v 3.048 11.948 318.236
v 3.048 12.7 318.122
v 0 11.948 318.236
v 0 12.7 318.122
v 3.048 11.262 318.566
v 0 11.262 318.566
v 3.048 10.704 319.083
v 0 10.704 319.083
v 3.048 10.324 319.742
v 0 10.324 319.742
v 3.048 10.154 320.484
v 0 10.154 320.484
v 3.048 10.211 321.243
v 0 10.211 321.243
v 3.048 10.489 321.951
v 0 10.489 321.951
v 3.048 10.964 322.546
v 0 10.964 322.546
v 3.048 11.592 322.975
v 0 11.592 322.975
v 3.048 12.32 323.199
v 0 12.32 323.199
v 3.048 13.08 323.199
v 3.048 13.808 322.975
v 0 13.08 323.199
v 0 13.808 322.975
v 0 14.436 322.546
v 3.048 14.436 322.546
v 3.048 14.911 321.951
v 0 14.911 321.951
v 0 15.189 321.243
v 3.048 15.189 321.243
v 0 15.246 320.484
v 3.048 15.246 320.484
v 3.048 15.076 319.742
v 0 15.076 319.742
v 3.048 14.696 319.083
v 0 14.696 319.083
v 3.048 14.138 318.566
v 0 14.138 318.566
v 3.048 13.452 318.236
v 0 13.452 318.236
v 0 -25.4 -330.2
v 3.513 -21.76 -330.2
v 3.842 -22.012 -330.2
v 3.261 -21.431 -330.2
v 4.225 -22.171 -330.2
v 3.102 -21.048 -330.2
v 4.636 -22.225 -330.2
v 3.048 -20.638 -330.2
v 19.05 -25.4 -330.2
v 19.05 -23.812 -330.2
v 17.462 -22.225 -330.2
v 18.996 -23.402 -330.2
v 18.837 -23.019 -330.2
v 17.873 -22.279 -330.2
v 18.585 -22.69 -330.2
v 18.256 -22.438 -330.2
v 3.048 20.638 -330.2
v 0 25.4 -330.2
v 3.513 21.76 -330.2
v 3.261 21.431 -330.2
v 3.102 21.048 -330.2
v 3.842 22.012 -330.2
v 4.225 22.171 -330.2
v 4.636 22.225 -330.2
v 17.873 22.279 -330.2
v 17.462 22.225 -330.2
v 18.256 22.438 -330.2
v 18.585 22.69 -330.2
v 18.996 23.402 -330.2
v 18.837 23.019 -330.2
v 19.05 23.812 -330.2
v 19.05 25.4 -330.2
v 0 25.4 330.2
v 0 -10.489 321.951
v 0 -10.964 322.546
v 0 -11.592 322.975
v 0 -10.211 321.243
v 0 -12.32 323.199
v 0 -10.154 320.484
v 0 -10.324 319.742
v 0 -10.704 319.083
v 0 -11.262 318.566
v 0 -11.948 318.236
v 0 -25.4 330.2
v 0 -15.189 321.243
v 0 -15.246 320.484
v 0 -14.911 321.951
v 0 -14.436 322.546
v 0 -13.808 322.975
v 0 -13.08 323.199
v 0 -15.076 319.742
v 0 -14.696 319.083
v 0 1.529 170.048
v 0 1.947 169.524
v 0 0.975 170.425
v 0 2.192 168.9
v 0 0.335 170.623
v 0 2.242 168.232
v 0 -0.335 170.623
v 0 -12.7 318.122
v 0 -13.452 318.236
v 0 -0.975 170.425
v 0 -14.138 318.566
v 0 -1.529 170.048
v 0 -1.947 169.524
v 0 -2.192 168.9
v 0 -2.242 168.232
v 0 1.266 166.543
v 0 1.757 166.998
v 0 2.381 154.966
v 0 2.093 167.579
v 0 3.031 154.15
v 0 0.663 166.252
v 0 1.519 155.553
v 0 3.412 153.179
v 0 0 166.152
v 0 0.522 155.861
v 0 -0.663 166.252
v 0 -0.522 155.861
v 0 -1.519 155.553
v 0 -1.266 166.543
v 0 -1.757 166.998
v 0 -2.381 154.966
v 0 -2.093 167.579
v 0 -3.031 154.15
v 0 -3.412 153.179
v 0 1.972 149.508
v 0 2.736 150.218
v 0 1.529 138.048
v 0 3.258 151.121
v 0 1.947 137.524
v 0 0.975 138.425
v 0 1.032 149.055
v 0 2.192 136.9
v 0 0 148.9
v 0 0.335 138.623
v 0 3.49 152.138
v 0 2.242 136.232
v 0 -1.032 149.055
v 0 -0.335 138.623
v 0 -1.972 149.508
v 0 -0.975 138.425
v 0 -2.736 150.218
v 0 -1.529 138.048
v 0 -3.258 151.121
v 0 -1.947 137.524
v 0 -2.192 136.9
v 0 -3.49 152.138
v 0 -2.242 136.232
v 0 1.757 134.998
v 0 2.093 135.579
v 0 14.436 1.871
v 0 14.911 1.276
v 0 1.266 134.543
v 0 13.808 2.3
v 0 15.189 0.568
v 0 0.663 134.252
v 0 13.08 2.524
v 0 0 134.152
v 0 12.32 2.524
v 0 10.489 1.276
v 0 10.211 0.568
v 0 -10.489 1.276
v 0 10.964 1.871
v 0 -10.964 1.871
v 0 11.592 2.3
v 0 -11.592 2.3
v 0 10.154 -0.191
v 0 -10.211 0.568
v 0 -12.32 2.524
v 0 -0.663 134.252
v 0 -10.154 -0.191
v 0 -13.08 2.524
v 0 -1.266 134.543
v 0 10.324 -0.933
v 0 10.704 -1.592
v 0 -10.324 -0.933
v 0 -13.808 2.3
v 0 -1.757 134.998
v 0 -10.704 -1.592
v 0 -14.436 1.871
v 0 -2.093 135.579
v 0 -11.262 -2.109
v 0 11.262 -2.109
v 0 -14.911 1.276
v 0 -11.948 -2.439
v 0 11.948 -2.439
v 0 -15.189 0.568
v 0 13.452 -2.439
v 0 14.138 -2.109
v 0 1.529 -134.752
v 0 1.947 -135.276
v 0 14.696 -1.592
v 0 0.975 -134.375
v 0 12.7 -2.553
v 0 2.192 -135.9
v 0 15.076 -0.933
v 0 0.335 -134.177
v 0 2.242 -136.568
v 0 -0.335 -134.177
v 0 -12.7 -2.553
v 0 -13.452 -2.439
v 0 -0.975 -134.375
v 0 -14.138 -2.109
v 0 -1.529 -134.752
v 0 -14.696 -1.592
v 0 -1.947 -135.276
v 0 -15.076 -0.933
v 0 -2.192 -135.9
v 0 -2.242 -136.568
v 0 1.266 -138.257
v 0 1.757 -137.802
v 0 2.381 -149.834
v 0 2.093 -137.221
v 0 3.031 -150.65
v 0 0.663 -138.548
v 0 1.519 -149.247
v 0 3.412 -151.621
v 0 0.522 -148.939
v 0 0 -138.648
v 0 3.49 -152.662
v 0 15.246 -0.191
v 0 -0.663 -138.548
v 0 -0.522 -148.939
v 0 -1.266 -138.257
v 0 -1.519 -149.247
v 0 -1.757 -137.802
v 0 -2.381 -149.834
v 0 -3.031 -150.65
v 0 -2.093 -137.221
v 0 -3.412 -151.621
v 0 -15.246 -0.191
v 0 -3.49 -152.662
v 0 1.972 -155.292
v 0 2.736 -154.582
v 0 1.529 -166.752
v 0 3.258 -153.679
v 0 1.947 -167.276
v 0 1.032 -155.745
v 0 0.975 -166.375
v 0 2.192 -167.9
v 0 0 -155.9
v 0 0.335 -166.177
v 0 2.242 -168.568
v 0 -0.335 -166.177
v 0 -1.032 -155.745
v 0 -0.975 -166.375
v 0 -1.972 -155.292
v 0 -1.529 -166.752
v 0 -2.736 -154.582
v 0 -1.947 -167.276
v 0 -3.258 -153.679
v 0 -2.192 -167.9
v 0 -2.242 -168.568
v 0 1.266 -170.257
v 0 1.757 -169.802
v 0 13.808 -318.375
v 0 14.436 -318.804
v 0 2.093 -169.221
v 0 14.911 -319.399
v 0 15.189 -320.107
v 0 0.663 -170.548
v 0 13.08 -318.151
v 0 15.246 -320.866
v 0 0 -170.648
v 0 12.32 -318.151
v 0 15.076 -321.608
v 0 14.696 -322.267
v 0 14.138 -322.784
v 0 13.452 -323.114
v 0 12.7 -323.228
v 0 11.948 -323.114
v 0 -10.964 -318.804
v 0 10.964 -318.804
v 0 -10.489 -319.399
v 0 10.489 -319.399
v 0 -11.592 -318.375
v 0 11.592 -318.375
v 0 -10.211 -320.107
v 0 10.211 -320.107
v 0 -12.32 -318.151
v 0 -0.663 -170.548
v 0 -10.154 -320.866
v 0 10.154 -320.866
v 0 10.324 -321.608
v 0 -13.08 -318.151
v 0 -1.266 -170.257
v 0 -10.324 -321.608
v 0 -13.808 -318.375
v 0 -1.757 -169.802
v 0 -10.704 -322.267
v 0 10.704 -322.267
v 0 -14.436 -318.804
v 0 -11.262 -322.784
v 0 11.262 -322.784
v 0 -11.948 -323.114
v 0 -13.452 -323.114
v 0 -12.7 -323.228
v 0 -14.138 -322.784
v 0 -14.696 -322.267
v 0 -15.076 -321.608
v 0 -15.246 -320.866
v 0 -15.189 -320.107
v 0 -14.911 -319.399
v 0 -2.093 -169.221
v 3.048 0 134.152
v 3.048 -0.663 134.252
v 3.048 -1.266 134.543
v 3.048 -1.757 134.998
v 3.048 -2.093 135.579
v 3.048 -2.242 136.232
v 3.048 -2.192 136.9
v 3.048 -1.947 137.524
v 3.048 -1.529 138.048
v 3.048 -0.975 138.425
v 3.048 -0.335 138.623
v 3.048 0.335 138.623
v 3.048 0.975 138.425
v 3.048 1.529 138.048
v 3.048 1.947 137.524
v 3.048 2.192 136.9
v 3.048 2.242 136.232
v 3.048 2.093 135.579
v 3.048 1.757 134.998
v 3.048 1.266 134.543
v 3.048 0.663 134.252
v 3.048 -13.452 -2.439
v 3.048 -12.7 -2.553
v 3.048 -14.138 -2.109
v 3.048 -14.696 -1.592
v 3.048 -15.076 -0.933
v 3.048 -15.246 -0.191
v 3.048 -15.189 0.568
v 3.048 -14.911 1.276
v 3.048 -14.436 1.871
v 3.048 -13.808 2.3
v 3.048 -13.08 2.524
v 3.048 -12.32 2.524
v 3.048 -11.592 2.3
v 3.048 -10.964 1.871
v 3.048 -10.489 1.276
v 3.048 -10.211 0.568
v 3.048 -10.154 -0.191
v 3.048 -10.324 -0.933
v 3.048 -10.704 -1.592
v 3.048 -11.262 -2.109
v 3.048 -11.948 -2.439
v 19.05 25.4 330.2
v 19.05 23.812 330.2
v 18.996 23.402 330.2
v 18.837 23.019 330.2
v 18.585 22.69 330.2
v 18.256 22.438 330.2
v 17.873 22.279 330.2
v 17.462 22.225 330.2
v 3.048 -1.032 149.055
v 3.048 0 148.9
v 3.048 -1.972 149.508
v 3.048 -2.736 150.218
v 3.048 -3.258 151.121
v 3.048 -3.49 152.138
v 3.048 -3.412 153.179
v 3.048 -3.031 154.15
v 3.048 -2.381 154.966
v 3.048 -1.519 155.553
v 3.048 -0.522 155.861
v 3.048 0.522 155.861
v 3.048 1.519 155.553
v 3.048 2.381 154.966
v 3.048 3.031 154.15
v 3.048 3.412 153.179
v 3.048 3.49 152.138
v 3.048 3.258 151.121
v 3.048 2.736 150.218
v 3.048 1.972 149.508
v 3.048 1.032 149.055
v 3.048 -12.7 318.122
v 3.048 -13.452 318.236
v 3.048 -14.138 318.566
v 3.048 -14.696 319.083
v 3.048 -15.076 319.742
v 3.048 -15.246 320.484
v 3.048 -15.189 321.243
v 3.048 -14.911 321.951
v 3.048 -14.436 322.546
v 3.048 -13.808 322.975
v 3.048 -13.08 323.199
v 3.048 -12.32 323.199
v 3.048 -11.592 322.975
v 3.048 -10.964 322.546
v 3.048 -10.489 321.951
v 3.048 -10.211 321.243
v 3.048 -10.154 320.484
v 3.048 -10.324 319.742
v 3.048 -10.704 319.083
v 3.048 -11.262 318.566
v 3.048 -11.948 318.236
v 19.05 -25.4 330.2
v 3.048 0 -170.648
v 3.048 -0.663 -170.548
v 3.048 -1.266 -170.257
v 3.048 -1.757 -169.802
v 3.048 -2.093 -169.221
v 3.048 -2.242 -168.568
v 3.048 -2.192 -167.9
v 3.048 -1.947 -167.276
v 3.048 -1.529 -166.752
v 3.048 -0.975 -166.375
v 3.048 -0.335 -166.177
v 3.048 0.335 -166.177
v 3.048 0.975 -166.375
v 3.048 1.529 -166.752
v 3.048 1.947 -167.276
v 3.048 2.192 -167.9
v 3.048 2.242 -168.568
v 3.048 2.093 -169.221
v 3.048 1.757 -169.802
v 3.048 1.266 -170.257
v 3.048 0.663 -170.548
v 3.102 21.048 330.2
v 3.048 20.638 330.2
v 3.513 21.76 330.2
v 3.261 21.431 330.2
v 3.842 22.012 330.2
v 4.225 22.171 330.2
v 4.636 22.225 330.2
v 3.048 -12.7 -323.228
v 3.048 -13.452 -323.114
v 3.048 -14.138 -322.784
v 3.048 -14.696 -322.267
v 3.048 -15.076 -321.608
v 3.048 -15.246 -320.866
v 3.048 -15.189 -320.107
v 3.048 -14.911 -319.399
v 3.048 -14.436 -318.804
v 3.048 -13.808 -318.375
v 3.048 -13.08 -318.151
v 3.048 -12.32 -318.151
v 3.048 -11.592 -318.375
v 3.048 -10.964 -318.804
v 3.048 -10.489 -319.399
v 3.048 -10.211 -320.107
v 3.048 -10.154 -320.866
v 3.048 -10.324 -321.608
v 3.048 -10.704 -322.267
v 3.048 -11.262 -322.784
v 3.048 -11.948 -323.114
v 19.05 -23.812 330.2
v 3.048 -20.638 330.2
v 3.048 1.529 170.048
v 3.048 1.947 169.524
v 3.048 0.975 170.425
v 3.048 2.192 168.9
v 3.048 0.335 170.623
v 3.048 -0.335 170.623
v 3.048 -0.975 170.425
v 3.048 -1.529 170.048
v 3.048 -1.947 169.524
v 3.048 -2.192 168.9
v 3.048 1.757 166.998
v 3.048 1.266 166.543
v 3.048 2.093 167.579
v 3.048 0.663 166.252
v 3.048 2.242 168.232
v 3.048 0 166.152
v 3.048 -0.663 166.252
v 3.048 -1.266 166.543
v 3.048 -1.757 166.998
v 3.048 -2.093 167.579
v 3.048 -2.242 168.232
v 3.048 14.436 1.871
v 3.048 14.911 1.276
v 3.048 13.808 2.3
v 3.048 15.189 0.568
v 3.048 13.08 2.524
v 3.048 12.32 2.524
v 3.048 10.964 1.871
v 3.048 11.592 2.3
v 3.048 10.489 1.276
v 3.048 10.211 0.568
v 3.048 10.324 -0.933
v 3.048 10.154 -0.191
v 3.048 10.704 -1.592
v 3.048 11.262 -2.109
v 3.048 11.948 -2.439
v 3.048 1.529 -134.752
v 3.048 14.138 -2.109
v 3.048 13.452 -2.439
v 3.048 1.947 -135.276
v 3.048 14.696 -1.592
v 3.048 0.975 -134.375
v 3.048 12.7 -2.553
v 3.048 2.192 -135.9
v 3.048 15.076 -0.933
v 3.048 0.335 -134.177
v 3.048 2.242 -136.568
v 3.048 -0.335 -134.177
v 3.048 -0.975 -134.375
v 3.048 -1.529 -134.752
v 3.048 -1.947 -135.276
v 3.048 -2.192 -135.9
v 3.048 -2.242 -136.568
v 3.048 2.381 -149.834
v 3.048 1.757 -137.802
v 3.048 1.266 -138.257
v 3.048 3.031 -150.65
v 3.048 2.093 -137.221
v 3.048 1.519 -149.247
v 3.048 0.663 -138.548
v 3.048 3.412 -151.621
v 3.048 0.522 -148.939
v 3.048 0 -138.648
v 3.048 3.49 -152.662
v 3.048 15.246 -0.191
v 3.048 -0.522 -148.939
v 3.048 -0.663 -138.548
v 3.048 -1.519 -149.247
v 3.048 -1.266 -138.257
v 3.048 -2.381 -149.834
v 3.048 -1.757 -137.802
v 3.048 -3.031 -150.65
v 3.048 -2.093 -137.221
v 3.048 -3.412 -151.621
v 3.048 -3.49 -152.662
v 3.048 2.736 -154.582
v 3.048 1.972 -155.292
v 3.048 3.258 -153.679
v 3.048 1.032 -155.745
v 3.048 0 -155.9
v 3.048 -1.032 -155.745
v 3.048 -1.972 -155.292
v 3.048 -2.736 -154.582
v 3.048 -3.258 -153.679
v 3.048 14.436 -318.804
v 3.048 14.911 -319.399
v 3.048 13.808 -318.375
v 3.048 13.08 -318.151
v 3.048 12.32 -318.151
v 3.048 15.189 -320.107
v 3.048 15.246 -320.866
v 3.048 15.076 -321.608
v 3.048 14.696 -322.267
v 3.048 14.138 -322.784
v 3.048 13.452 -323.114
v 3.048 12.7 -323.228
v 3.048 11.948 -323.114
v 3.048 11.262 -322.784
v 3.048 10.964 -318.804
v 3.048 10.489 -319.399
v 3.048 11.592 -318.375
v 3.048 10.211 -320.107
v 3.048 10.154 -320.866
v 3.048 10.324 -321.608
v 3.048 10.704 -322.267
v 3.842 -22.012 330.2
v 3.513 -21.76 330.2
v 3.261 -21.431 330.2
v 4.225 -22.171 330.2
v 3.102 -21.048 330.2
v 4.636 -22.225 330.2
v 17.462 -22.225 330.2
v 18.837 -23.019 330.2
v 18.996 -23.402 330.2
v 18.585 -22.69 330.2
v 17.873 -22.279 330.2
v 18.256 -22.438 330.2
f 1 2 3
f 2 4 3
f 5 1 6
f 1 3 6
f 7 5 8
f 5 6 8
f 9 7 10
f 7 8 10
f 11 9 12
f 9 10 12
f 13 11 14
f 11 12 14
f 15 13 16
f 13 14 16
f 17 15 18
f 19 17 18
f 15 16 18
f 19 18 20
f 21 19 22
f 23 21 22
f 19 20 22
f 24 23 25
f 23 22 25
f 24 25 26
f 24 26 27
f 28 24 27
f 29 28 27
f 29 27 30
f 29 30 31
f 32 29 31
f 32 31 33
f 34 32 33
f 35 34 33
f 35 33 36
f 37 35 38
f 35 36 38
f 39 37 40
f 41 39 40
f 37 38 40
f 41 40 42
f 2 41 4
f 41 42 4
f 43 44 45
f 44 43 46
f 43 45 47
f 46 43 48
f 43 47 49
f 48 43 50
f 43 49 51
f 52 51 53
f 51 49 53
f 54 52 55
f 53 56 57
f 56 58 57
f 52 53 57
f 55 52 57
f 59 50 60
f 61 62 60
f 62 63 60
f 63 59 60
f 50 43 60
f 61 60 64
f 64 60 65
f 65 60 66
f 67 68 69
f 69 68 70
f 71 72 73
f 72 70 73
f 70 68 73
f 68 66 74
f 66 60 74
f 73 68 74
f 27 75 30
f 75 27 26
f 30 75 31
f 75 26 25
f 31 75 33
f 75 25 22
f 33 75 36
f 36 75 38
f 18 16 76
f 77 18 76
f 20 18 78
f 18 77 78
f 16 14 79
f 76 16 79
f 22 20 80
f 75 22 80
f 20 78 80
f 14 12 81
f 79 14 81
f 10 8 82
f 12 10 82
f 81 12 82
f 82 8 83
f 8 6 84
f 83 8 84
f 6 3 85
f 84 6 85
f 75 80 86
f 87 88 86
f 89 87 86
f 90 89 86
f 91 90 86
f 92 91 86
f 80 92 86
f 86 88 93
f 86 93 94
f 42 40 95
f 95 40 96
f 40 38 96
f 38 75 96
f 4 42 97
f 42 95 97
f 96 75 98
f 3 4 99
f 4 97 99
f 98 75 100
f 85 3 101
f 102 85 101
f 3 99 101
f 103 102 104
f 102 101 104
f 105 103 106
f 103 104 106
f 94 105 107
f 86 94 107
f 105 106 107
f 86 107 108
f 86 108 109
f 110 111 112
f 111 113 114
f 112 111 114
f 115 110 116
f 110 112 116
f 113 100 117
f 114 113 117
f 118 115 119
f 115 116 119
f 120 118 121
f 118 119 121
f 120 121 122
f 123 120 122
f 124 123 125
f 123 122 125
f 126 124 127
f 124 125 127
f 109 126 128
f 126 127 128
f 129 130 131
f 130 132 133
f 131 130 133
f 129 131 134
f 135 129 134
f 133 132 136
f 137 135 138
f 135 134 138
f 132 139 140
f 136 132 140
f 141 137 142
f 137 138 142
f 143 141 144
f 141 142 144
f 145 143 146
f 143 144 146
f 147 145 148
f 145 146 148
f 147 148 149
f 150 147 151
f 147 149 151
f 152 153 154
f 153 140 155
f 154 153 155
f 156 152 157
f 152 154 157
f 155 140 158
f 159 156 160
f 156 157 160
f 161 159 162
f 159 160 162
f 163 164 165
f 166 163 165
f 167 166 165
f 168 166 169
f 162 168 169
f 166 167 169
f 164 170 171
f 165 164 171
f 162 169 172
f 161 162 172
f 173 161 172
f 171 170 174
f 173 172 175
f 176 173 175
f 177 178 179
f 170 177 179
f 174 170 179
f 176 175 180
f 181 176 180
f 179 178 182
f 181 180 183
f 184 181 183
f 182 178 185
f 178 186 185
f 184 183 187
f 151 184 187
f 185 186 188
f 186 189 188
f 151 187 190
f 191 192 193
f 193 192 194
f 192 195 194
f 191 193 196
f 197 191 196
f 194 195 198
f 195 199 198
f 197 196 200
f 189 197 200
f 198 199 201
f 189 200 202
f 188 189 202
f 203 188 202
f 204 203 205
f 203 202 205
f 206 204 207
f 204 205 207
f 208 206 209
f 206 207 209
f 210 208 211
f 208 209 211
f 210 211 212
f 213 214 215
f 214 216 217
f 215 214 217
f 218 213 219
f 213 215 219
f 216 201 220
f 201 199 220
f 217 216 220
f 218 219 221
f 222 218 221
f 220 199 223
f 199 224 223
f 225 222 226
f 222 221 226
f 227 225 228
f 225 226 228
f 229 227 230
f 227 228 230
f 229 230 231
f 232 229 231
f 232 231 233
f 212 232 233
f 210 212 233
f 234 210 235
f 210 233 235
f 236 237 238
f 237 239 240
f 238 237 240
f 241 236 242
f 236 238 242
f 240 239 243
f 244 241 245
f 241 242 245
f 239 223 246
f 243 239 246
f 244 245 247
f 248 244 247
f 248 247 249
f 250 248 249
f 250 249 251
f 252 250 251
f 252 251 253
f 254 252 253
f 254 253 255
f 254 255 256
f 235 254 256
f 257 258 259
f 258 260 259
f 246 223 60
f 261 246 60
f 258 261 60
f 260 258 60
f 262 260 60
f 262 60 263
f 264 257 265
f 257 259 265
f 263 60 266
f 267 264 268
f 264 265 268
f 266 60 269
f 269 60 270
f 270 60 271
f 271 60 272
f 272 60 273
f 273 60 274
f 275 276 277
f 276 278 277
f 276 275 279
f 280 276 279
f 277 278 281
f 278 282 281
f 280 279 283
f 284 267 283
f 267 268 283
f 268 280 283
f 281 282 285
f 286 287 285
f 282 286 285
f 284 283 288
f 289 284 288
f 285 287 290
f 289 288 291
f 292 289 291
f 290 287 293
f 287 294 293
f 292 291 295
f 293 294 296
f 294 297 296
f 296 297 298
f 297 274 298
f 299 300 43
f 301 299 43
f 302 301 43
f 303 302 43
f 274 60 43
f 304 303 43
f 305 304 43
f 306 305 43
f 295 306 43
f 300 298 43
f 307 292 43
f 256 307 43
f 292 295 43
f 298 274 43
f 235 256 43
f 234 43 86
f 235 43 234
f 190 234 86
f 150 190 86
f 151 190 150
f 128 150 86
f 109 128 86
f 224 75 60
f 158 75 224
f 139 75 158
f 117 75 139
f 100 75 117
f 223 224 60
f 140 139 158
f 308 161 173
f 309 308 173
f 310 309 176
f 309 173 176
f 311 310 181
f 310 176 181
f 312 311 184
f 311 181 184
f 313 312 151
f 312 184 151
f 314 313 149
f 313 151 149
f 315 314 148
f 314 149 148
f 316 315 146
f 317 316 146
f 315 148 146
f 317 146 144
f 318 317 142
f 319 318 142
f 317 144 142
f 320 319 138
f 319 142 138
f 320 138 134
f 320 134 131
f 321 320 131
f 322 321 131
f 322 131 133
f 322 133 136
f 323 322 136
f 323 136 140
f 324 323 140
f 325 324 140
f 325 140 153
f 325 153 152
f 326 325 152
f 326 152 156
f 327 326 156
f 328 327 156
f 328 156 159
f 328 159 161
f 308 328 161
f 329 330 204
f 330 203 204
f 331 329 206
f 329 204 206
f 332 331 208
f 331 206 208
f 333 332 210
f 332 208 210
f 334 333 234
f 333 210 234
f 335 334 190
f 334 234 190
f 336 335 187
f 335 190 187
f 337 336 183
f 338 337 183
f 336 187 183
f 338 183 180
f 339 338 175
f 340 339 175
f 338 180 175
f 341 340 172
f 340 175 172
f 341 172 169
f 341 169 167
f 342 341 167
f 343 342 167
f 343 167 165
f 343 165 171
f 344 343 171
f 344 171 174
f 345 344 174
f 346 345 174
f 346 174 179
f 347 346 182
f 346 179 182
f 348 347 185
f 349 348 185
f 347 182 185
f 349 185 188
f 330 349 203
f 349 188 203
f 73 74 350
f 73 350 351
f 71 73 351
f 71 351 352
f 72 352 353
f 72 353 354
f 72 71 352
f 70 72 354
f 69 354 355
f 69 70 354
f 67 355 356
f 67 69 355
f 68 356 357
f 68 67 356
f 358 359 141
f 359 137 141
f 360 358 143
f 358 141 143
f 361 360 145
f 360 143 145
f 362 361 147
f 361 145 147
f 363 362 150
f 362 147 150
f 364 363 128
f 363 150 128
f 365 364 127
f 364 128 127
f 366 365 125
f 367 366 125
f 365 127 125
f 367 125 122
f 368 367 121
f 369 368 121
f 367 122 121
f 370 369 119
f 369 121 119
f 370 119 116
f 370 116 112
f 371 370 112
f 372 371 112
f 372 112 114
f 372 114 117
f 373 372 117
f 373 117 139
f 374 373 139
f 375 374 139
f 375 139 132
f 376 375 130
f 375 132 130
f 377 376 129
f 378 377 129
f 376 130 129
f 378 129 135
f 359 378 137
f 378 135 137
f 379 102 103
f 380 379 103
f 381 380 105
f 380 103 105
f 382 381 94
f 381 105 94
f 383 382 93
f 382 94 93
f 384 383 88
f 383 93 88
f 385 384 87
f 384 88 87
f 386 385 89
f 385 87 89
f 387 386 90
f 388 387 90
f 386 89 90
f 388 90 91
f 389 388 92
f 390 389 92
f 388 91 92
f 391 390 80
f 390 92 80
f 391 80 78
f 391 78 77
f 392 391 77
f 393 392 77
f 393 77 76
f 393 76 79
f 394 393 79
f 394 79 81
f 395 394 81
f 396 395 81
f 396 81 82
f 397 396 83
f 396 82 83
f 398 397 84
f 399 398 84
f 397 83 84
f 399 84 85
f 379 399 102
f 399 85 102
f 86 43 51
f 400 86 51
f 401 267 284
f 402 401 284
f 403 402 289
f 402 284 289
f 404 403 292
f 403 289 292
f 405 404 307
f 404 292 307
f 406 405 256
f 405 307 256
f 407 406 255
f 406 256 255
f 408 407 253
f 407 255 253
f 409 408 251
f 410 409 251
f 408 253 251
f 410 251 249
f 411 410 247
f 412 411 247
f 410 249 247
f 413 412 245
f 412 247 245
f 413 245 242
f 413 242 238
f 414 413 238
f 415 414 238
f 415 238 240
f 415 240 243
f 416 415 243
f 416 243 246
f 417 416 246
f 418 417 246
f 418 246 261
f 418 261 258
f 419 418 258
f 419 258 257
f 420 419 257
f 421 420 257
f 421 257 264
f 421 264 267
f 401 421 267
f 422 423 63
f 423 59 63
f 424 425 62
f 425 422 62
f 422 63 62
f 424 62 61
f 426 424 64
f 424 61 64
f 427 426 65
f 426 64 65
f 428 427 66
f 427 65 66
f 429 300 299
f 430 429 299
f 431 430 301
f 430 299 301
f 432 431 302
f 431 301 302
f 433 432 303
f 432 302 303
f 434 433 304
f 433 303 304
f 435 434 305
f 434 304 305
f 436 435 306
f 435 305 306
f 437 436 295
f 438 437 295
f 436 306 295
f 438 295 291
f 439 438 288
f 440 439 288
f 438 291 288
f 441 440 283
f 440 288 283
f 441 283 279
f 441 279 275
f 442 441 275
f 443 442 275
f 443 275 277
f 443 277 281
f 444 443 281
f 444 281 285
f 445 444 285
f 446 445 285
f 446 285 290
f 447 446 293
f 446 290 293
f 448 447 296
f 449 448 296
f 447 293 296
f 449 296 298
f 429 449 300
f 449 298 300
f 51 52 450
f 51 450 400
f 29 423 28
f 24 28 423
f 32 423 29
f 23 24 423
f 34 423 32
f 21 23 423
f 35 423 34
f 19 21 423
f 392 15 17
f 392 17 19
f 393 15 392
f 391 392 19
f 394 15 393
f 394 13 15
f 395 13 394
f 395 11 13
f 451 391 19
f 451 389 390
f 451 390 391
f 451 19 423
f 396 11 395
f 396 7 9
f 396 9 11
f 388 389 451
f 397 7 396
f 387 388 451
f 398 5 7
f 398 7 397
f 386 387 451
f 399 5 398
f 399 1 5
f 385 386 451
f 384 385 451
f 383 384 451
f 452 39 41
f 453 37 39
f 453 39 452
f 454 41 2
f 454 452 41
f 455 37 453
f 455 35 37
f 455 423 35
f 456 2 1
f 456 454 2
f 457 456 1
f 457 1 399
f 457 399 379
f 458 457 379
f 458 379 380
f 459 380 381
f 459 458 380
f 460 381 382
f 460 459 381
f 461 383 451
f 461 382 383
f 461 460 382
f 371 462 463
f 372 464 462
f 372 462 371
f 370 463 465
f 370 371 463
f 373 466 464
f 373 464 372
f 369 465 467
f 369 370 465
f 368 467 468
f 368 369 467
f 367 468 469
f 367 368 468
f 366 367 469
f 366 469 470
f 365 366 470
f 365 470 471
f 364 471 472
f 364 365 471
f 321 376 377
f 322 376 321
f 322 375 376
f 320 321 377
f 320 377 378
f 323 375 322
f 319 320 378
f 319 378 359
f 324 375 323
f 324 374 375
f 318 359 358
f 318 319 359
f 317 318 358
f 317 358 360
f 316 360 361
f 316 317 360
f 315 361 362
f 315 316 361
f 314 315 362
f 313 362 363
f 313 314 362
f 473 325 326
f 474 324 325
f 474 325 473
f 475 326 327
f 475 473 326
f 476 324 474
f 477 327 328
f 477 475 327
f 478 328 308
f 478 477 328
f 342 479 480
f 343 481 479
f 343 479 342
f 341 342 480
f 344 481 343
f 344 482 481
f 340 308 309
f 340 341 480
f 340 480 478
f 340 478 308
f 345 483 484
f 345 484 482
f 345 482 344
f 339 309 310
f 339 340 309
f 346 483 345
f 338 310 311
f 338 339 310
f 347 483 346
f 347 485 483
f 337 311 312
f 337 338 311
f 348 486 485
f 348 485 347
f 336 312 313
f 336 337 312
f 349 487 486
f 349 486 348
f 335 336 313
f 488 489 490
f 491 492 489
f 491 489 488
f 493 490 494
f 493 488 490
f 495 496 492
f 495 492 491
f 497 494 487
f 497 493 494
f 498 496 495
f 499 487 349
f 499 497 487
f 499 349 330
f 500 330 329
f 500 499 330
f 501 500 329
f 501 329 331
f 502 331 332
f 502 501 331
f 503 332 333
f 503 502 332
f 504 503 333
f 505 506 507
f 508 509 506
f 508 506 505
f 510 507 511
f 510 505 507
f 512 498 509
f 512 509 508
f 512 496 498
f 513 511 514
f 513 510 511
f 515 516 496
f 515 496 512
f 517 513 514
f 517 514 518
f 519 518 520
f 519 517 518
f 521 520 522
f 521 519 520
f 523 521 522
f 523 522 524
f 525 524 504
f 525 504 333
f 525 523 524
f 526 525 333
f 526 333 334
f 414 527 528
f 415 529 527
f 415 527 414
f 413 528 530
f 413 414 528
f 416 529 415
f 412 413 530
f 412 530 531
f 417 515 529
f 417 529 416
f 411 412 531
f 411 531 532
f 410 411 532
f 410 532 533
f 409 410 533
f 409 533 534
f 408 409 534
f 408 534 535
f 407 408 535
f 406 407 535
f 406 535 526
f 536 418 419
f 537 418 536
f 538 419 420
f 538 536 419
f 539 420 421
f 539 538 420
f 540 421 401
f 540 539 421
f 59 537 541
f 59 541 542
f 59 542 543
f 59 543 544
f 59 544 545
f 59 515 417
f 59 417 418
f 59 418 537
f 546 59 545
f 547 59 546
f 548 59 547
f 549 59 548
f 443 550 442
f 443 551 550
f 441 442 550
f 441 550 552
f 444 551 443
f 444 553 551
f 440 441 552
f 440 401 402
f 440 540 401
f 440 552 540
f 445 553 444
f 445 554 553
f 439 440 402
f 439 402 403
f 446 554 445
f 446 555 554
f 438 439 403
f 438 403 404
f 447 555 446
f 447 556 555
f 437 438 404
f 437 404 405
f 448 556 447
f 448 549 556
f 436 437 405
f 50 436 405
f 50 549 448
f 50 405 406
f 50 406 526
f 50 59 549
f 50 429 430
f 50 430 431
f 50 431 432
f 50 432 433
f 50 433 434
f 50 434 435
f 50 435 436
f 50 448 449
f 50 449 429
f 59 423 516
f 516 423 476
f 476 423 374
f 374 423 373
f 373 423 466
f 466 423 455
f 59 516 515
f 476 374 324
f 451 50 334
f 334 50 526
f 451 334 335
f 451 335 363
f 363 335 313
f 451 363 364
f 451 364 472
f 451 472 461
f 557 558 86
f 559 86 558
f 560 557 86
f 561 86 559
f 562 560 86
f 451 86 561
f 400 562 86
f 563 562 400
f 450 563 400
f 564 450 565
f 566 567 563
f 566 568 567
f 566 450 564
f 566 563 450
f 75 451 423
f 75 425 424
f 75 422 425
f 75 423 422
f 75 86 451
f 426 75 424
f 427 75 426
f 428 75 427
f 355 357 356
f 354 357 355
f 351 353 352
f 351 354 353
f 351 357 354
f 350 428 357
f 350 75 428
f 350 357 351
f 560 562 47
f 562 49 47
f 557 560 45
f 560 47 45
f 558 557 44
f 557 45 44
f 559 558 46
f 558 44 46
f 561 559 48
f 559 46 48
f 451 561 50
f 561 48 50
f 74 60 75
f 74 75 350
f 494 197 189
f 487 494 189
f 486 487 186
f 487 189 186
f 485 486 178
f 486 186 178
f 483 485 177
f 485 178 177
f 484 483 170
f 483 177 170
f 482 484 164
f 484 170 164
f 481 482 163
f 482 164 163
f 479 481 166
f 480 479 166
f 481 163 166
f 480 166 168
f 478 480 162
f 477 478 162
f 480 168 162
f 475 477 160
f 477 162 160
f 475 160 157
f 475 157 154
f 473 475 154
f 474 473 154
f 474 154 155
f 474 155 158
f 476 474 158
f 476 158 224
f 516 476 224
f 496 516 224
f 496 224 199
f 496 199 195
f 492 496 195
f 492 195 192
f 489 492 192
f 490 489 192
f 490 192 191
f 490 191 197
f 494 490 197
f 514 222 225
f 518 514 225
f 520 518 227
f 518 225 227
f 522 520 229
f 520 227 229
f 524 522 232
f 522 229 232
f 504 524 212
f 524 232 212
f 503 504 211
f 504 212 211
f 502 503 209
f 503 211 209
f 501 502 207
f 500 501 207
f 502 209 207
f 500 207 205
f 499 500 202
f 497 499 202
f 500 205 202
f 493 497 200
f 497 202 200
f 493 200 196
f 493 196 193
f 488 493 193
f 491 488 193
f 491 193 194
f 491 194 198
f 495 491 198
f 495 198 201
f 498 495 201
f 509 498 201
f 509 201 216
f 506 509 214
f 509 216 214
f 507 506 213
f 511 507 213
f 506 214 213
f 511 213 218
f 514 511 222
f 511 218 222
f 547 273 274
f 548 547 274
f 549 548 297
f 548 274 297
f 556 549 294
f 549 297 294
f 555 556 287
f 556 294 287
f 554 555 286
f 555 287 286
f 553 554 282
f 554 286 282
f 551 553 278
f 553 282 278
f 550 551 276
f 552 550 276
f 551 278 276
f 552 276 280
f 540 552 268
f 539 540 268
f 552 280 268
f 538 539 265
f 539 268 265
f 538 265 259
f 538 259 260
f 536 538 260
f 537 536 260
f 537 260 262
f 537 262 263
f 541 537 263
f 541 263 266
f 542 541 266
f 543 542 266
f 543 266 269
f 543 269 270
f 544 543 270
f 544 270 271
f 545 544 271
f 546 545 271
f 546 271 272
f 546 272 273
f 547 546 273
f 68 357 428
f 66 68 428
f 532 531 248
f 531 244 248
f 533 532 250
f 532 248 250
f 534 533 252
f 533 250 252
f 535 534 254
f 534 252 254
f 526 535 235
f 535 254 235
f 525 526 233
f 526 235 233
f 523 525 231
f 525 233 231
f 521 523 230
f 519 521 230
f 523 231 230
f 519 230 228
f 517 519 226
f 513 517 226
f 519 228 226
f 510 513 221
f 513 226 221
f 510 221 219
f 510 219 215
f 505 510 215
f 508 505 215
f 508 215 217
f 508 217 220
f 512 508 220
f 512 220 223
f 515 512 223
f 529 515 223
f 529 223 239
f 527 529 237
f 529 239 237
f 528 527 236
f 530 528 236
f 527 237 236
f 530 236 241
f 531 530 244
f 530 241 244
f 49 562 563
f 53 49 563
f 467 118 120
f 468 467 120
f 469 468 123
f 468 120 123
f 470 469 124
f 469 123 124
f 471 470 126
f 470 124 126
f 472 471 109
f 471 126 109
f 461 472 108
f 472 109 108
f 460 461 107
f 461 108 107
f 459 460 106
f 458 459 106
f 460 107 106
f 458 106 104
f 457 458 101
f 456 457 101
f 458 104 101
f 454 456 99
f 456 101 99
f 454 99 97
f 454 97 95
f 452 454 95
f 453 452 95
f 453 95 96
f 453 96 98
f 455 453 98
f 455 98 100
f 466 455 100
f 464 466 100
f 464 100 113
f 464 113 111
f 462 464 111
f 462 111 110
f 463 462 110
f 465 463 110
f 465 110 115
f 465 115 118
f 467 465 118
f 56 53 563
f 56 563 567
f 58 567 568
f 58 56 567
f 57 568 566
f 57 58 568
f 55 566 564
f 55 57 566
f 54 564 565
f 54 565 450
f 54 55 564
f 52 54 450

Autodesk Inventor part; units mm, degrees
ref_plane "YZ Plane" through (0, 0, 0) normal (1, 0, 0) x (0, 1, 0)
ref_plane "XZ Plane" through (0, 0, 0) normal (0, 1, 0) x (-1, 0, 0)
ref_plane "XY Plane" through (0, 0, 0) normal (0, 0, 1) x (1, 0, 0)
sketch "Sketch1" plane through (0, 0, 0) normal (0, 0, 1) x (1, 0, 0)
  line L0 (0, 25.4) -> (0, -25.4)
  line L1 (0, -25.4) -> (19.05, -25.4)
  line L2 (0, 25.4) -> (19.05, 25.4)
  line L3 (19.05, 25.4) -> (19.05, 22.225)
  line L4 (19.05, 22.225) -> (3.048, 22.225)
  line L5 (3.048, 22.225) -> (3.048, -22.225)
  line L6 (3.048, -22.225) -> (19.05, -22.225)
  line L7 (19.05, -22.225) -> (19.05, -25.4)
  point P0 (0, 0)
  point P1 (0, 0)
  dimension "d0" = 50.8
  dimension "d1" = 19.05
  dimension "d2" = 3.175
  dimension "d3" = 16.002
extrude "Extrusion1" add sketch "Sketch1" along normal mid plane 660.4
fillet "Fillet1" radius 1.5875 4 edges at (3.048, 22.225, 0) (3.048, -22.225, 0) (19.05, -22.225, 0) (19.05, 22.225, 0)
sketch "Sketch2" plane through (3.048, -20.6375, -330.2) normal (1, 0, 0) x (0, 0, -1)
  point P0 (-330.2, 20.6375)
  point P1 (-177.8, 20.6375)
  point P2 (-482.6, 20.6375)
  dimension "d7" = 304.8
  dimension "d8" = 152.4
hole "Hole1" at (3.048, 0, -152.4) at (3.048, 0, 152.4) direction (-1, 0, 0) diameter 7 end through all
sketch "Sketch3" plane through (3.048, -20.6375, -330.2) normal (1, 0, 0) x (0, 0, -1)
  line L0 (-650.875, 33.3375) -> (-9.525, 33.3375)
  line L1 (-9.525, 33.3375) -> (-9.525, 7.9375)
  line L2 (-9.525, 7.9375) -> (-650.875, 7.9375)
  line L3 (-650.875, 7.9375) -> (-650.875, 33.3375)
  line L4 (-650.875, 33.3375) -> (-9.525, 7.9375) construction
  line L5 (-9.525, 33.3375) -> (-650.875, 7.9375) construction
  line L6 (0, 41.275) -> (0, 0) projected
  line L7 (-660.4, 0) -> (-660.4, 41.275) projected
  line L8 (0, -4.7625) -> (-660.4, -4.7625) projected
  line L9 (0, 46.0375) -> (-660.4, 46.0375) projected
  point P0 (-330.2, 20.6375)
  point P1 (-330.2, 7.9375)
  point P2 (-330.2, 33.3375)
  dimension "d34" = 9.525
  dimension "d35" = 9.525
  dimension "d36" = 12.7
  dimension "d37" = 12.7
hole "Hole2" at (3.048, -12.7, 320.675) at (3.048, 12.7, 320.675) at (3.048, -12.7, 0) at (3.048, 12.7, 0) at (3.048, -12.7, -320.675) at (3.048, 12.7, -320.675) direction (-1, 0, 0) diameter 5.1054 depth 25.4 tip angle 118 clearance for "Flat Head Machine Screw (82)" size "#10" standard "Ansi Unified Screw Threads"
sketch "Sketch5" plane through (3.048, -20.6375, -330.2) normal (1, 0, 0) x (0, 0, -1)
  circle A0 centre (-482.6, 20.6375) radius 3.5 projected
  circle A1 centre (-177.8, 20.6375) radius 3.5 projected
  point P0 (-330.2, 20.6375)
  point P1 (-466.6, 20.6375)
  point P2 (-498.6, 20.6375)
  point P3 (-193.8, 20.6375)
  point P4 (-161.8, 20.6375)
  dimension "d23" = 32
  dimension "d24" = 16
  dimension "d25" = 32
  dimension "d26" = 16
hole "Hole3" at (3.048, 0, 168.4) at (3.048, 0, 136.4) at (3.048, 0, -136.4) at (3.048, 0, -168.4) direction (-1, 0, 0) diameter 4.4958 end through all clearance for "Socket Head Cap Screw DIN EN ISO 4762" size "M4" standard "DIN"
equation "\"d4\" = Length"
equation "\"Length\" = 660.4"
properties part number "NASA-20-FR-OP-01" material "Aluminum 6061"
